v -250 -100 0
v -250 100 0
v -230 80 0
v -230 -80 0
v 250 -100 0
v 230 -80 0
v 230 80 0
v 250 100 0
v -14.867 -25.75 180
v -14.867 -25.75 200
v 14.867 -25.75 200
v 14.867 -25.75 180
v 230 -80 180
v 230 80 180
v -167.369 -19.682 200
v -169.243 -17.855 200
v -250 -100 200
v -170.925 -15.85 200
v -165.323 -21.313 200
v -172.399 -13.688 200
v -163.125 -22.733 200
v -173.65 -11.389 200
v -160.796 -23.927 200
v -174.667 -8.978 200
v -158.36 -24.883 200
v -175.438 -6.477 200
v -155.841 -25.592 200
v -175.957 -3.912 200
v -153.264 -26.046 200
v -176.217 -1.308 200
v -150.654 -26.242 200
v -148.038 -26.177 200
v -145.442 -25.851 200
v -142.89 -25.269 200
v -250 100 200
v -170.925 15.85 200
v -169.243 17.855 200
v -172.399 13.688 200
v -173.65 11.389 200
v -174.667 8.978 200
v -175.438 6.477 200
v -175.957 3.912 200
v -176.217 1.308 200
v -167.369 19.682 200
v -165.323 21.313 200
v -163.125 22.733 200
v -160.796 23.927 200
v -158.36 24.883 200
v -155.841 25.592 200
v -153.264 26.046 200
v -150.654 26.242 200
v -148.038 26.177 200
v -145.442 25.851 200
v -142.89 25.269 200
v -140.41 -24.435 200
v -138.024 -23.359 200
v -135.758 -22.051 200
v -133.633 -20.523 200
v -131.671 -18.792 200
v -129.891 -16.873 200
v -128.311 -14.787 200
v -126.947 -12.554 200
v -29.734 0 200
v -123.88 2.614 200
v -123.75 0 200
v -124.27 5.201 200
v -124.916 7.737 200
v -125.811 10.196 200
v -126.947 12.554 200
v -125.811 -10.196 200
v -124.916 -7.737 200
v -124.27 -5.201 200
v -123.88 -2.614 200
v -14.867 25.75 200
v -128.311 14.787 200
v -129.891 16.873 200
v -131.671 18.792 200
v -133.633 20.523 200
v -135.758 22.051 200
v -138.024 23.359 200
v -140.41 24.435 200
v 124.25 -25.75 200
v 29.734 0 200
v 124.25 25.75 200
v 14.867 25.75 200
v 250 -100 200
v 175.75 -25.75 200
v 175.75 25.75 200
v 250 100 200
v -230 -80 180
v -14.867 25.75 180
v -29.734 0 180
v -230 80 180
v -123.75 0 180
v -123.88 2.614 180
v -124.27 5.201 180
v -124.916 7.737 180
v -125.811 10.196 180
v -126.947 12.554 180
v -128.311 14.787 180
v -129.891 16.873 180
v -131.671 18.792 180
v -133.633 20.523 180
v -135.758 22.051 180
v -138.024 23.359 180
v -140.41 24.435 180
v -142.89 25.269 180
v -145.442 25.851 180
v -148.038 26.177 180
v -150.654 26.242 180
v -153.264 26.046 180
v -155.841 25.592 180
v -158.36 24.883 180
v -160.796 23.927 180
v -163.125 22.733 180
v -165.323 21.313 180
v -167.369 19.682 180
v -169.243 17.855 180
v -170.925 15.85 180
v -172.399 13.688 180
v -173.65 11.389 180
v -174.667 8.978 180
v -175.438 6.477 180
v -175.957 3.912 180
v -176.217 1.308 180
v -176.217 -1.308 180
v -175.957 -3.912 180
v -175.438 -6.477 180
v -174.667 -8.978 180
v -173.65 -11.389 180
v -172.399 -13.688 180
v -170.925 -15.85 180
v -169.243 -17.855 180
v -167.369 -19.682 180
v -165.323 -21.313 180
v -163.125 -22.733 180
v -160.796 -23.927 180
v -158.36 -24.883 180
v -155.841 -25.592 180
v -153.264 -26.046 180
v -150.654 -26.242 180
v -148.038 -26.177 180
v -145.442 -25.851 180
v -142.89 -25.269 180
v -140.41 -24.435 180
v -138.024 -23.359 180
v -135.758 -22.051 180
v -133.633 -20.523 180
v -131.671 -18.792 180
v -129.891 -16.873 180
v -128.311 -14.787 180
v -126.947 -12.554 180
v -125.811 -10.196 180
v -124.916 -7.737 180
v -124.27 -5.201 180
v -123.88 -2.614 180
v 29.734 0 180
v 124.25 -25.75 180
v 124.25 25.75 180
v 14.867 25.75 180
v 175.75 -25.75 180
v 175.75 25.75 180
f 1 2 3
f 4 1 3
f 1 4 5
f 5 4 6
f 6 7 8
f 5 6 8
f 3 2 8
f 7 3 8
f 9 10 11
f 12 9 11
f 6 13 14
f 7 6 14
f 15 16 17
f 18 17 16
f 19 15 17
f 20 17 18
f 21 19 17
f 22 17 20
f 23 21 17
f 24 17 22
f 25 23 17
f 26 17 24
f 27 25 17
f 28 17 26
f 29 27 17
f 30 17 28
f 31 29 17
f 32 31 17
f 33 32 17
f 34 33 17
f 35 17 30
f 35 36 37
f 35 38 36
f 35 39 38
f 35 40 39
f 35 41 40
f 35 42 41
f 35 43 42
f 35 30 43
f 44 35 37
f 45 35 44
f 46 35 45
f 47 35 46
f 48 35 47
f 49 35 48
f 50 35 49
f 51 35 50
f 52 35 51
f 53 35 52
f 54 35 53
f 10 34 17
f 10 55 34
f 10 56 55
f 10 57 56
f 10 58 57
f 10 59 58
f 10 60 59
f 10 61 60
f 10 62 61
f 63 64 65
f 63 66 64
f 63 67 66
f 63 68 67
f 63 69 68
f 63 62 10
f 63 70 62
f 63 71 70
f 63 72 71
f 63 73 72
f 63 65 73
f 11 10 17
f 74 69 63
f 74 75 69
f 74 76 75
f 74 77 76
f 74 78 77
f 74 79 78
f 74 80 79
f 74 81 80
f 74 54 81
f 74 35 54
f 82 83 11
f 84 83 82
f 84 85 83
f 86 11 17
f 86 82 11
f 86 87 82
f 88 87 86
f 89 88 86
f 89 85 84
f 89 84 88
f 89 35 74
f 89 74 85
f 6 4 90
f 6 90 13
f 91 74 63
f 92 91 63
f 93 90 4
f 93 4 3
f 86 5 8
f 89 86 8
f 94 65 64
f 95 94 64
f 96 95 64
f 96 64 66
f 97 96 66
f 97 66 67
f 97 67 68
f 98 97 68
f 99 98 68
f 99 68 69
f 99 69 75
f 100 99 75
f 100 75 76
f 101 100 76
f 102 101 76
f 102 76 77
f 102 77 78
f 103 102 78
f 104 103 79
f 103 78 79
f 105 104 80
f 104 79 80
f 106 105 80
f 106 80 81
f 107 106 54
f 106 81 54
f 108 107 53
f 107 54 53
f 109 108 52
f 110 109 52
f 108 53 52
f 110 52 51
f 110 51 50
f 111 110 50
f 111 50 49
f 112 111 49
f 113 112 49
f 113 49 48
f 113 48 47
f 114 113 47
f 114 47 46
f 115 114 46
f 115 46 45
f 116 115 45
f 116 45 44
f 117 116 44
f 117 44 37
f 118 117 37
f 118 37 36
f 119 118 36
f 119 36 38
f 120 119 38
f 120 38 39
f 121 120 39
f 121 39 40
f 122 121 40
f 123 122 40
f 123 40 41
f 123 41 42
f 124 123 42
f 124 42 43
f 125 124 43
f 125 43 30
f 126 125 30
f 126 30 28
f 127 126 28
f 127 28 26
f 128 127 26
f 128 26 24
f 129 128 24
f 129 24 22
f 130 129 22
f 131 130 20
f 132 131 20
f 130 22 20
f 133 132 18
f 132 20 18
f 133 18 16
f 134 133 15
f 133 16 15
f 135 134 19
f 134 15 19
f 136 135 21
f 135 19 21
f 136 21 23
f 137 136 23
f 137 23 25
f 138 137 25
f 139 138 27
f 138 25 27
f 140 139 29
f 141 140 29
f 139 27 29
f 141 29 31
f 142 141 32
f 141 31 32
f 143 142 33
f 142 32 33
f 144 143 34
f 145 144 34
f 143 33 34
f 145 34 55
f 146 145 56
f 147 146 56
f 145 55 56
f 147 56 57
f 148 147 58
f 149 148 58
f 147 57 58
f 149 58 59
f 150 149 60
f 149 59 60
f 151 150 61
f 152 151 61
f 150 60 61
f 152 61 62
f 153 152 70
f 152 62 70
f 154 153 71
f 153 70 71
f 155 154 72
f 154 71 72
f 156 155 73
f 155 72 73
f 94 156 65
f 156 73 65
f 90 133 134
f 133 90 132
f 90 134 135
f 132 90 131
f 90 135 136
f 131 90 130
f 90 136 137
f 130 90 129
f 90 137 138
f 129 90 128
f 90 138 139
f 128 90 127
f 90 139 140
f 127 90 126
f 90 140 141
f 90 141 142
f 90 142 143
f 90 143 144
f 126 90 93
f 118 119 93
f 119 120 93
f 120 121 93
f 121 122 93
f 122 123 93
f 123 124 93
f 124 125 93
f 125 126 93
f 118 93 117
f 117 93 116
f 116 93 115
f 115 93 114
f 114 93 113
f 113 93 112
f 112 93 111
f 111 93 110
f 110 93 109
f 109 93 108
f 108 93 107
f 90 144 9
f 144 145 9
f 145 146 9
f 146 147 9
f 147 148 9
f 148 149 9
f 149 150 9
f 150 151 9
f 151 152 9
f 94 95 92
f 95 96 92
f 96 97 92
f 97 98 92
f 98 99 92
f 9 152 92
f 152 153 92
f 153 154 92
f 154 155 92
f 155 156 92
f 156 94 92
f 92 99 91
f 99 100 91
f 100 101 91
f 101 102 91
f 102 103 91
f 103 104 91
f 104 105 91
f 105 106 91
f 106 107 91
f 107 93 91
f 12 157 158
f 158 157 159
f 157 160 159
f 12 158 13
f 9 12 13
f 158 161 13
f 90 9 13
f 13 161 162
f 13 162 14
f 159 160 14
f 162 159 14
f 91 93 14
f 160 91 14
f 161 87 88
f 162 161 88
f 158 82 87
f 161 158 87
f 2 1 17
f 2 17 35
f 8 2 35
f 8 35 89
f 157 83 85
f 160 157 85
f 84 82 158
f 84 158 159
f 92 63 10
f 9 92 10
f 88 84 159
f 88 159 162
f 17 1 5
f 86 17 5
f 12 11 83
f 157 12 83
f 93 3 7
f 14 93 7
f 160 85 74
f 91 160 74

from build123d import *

# Parameters (mm, degrees)
SKETCH5_W           = 500
SKETCH5_H           = 200
BOSS_EXTRUDE2_DEPTH = 200
SHELL2_T            = -20
SKETCH6_R           = 26.25
SKETCH6_W           = 51.5
SKETCH6_H           = 51.5
CUT_EXTRUDE2_DEPTH  = 51.6


with BuildPart() as part:
    # Sketch5 → Boss-Extrude2 (new body)
    with BuildSketch(Plane.XY):
        Rectangle(SKETCH5_W, SKETCH5_H)
    extrude(amount=BOSS_EXTRUDE2_DEPTH)

    # Shell2
    shell2_openings = [part.faces().sort_by_distance(p)[0] for p in [
        (0, 0, 0),
    ]]
    offset(amount=SHELL2_T, openings=shell2_openings, kind=Kind.INTERSECTION)

    # Sketch6 → Cut-Extrude2 (cut)
    with BuildSketch(Plane.XY.offset(200)):
        with Locations((-150, 0)):
            Circle(SKETCH6_R)
        Polygon((14.866769432, 25.75), (-14.866769432, 25.75), (-29.733538863, 0), (-14.866769432, -25.75), (14.866769432, -25.75), (29.733538863, 0), align=None)
        with Locations((150, 0)):
            Rectangle(SKETCH6_W, SKETCH6_H)
    extrude(amount=-CUT_EXTRUDE2_DEPTH, mode=Mode.SUBTRACT)


solid = part.part
